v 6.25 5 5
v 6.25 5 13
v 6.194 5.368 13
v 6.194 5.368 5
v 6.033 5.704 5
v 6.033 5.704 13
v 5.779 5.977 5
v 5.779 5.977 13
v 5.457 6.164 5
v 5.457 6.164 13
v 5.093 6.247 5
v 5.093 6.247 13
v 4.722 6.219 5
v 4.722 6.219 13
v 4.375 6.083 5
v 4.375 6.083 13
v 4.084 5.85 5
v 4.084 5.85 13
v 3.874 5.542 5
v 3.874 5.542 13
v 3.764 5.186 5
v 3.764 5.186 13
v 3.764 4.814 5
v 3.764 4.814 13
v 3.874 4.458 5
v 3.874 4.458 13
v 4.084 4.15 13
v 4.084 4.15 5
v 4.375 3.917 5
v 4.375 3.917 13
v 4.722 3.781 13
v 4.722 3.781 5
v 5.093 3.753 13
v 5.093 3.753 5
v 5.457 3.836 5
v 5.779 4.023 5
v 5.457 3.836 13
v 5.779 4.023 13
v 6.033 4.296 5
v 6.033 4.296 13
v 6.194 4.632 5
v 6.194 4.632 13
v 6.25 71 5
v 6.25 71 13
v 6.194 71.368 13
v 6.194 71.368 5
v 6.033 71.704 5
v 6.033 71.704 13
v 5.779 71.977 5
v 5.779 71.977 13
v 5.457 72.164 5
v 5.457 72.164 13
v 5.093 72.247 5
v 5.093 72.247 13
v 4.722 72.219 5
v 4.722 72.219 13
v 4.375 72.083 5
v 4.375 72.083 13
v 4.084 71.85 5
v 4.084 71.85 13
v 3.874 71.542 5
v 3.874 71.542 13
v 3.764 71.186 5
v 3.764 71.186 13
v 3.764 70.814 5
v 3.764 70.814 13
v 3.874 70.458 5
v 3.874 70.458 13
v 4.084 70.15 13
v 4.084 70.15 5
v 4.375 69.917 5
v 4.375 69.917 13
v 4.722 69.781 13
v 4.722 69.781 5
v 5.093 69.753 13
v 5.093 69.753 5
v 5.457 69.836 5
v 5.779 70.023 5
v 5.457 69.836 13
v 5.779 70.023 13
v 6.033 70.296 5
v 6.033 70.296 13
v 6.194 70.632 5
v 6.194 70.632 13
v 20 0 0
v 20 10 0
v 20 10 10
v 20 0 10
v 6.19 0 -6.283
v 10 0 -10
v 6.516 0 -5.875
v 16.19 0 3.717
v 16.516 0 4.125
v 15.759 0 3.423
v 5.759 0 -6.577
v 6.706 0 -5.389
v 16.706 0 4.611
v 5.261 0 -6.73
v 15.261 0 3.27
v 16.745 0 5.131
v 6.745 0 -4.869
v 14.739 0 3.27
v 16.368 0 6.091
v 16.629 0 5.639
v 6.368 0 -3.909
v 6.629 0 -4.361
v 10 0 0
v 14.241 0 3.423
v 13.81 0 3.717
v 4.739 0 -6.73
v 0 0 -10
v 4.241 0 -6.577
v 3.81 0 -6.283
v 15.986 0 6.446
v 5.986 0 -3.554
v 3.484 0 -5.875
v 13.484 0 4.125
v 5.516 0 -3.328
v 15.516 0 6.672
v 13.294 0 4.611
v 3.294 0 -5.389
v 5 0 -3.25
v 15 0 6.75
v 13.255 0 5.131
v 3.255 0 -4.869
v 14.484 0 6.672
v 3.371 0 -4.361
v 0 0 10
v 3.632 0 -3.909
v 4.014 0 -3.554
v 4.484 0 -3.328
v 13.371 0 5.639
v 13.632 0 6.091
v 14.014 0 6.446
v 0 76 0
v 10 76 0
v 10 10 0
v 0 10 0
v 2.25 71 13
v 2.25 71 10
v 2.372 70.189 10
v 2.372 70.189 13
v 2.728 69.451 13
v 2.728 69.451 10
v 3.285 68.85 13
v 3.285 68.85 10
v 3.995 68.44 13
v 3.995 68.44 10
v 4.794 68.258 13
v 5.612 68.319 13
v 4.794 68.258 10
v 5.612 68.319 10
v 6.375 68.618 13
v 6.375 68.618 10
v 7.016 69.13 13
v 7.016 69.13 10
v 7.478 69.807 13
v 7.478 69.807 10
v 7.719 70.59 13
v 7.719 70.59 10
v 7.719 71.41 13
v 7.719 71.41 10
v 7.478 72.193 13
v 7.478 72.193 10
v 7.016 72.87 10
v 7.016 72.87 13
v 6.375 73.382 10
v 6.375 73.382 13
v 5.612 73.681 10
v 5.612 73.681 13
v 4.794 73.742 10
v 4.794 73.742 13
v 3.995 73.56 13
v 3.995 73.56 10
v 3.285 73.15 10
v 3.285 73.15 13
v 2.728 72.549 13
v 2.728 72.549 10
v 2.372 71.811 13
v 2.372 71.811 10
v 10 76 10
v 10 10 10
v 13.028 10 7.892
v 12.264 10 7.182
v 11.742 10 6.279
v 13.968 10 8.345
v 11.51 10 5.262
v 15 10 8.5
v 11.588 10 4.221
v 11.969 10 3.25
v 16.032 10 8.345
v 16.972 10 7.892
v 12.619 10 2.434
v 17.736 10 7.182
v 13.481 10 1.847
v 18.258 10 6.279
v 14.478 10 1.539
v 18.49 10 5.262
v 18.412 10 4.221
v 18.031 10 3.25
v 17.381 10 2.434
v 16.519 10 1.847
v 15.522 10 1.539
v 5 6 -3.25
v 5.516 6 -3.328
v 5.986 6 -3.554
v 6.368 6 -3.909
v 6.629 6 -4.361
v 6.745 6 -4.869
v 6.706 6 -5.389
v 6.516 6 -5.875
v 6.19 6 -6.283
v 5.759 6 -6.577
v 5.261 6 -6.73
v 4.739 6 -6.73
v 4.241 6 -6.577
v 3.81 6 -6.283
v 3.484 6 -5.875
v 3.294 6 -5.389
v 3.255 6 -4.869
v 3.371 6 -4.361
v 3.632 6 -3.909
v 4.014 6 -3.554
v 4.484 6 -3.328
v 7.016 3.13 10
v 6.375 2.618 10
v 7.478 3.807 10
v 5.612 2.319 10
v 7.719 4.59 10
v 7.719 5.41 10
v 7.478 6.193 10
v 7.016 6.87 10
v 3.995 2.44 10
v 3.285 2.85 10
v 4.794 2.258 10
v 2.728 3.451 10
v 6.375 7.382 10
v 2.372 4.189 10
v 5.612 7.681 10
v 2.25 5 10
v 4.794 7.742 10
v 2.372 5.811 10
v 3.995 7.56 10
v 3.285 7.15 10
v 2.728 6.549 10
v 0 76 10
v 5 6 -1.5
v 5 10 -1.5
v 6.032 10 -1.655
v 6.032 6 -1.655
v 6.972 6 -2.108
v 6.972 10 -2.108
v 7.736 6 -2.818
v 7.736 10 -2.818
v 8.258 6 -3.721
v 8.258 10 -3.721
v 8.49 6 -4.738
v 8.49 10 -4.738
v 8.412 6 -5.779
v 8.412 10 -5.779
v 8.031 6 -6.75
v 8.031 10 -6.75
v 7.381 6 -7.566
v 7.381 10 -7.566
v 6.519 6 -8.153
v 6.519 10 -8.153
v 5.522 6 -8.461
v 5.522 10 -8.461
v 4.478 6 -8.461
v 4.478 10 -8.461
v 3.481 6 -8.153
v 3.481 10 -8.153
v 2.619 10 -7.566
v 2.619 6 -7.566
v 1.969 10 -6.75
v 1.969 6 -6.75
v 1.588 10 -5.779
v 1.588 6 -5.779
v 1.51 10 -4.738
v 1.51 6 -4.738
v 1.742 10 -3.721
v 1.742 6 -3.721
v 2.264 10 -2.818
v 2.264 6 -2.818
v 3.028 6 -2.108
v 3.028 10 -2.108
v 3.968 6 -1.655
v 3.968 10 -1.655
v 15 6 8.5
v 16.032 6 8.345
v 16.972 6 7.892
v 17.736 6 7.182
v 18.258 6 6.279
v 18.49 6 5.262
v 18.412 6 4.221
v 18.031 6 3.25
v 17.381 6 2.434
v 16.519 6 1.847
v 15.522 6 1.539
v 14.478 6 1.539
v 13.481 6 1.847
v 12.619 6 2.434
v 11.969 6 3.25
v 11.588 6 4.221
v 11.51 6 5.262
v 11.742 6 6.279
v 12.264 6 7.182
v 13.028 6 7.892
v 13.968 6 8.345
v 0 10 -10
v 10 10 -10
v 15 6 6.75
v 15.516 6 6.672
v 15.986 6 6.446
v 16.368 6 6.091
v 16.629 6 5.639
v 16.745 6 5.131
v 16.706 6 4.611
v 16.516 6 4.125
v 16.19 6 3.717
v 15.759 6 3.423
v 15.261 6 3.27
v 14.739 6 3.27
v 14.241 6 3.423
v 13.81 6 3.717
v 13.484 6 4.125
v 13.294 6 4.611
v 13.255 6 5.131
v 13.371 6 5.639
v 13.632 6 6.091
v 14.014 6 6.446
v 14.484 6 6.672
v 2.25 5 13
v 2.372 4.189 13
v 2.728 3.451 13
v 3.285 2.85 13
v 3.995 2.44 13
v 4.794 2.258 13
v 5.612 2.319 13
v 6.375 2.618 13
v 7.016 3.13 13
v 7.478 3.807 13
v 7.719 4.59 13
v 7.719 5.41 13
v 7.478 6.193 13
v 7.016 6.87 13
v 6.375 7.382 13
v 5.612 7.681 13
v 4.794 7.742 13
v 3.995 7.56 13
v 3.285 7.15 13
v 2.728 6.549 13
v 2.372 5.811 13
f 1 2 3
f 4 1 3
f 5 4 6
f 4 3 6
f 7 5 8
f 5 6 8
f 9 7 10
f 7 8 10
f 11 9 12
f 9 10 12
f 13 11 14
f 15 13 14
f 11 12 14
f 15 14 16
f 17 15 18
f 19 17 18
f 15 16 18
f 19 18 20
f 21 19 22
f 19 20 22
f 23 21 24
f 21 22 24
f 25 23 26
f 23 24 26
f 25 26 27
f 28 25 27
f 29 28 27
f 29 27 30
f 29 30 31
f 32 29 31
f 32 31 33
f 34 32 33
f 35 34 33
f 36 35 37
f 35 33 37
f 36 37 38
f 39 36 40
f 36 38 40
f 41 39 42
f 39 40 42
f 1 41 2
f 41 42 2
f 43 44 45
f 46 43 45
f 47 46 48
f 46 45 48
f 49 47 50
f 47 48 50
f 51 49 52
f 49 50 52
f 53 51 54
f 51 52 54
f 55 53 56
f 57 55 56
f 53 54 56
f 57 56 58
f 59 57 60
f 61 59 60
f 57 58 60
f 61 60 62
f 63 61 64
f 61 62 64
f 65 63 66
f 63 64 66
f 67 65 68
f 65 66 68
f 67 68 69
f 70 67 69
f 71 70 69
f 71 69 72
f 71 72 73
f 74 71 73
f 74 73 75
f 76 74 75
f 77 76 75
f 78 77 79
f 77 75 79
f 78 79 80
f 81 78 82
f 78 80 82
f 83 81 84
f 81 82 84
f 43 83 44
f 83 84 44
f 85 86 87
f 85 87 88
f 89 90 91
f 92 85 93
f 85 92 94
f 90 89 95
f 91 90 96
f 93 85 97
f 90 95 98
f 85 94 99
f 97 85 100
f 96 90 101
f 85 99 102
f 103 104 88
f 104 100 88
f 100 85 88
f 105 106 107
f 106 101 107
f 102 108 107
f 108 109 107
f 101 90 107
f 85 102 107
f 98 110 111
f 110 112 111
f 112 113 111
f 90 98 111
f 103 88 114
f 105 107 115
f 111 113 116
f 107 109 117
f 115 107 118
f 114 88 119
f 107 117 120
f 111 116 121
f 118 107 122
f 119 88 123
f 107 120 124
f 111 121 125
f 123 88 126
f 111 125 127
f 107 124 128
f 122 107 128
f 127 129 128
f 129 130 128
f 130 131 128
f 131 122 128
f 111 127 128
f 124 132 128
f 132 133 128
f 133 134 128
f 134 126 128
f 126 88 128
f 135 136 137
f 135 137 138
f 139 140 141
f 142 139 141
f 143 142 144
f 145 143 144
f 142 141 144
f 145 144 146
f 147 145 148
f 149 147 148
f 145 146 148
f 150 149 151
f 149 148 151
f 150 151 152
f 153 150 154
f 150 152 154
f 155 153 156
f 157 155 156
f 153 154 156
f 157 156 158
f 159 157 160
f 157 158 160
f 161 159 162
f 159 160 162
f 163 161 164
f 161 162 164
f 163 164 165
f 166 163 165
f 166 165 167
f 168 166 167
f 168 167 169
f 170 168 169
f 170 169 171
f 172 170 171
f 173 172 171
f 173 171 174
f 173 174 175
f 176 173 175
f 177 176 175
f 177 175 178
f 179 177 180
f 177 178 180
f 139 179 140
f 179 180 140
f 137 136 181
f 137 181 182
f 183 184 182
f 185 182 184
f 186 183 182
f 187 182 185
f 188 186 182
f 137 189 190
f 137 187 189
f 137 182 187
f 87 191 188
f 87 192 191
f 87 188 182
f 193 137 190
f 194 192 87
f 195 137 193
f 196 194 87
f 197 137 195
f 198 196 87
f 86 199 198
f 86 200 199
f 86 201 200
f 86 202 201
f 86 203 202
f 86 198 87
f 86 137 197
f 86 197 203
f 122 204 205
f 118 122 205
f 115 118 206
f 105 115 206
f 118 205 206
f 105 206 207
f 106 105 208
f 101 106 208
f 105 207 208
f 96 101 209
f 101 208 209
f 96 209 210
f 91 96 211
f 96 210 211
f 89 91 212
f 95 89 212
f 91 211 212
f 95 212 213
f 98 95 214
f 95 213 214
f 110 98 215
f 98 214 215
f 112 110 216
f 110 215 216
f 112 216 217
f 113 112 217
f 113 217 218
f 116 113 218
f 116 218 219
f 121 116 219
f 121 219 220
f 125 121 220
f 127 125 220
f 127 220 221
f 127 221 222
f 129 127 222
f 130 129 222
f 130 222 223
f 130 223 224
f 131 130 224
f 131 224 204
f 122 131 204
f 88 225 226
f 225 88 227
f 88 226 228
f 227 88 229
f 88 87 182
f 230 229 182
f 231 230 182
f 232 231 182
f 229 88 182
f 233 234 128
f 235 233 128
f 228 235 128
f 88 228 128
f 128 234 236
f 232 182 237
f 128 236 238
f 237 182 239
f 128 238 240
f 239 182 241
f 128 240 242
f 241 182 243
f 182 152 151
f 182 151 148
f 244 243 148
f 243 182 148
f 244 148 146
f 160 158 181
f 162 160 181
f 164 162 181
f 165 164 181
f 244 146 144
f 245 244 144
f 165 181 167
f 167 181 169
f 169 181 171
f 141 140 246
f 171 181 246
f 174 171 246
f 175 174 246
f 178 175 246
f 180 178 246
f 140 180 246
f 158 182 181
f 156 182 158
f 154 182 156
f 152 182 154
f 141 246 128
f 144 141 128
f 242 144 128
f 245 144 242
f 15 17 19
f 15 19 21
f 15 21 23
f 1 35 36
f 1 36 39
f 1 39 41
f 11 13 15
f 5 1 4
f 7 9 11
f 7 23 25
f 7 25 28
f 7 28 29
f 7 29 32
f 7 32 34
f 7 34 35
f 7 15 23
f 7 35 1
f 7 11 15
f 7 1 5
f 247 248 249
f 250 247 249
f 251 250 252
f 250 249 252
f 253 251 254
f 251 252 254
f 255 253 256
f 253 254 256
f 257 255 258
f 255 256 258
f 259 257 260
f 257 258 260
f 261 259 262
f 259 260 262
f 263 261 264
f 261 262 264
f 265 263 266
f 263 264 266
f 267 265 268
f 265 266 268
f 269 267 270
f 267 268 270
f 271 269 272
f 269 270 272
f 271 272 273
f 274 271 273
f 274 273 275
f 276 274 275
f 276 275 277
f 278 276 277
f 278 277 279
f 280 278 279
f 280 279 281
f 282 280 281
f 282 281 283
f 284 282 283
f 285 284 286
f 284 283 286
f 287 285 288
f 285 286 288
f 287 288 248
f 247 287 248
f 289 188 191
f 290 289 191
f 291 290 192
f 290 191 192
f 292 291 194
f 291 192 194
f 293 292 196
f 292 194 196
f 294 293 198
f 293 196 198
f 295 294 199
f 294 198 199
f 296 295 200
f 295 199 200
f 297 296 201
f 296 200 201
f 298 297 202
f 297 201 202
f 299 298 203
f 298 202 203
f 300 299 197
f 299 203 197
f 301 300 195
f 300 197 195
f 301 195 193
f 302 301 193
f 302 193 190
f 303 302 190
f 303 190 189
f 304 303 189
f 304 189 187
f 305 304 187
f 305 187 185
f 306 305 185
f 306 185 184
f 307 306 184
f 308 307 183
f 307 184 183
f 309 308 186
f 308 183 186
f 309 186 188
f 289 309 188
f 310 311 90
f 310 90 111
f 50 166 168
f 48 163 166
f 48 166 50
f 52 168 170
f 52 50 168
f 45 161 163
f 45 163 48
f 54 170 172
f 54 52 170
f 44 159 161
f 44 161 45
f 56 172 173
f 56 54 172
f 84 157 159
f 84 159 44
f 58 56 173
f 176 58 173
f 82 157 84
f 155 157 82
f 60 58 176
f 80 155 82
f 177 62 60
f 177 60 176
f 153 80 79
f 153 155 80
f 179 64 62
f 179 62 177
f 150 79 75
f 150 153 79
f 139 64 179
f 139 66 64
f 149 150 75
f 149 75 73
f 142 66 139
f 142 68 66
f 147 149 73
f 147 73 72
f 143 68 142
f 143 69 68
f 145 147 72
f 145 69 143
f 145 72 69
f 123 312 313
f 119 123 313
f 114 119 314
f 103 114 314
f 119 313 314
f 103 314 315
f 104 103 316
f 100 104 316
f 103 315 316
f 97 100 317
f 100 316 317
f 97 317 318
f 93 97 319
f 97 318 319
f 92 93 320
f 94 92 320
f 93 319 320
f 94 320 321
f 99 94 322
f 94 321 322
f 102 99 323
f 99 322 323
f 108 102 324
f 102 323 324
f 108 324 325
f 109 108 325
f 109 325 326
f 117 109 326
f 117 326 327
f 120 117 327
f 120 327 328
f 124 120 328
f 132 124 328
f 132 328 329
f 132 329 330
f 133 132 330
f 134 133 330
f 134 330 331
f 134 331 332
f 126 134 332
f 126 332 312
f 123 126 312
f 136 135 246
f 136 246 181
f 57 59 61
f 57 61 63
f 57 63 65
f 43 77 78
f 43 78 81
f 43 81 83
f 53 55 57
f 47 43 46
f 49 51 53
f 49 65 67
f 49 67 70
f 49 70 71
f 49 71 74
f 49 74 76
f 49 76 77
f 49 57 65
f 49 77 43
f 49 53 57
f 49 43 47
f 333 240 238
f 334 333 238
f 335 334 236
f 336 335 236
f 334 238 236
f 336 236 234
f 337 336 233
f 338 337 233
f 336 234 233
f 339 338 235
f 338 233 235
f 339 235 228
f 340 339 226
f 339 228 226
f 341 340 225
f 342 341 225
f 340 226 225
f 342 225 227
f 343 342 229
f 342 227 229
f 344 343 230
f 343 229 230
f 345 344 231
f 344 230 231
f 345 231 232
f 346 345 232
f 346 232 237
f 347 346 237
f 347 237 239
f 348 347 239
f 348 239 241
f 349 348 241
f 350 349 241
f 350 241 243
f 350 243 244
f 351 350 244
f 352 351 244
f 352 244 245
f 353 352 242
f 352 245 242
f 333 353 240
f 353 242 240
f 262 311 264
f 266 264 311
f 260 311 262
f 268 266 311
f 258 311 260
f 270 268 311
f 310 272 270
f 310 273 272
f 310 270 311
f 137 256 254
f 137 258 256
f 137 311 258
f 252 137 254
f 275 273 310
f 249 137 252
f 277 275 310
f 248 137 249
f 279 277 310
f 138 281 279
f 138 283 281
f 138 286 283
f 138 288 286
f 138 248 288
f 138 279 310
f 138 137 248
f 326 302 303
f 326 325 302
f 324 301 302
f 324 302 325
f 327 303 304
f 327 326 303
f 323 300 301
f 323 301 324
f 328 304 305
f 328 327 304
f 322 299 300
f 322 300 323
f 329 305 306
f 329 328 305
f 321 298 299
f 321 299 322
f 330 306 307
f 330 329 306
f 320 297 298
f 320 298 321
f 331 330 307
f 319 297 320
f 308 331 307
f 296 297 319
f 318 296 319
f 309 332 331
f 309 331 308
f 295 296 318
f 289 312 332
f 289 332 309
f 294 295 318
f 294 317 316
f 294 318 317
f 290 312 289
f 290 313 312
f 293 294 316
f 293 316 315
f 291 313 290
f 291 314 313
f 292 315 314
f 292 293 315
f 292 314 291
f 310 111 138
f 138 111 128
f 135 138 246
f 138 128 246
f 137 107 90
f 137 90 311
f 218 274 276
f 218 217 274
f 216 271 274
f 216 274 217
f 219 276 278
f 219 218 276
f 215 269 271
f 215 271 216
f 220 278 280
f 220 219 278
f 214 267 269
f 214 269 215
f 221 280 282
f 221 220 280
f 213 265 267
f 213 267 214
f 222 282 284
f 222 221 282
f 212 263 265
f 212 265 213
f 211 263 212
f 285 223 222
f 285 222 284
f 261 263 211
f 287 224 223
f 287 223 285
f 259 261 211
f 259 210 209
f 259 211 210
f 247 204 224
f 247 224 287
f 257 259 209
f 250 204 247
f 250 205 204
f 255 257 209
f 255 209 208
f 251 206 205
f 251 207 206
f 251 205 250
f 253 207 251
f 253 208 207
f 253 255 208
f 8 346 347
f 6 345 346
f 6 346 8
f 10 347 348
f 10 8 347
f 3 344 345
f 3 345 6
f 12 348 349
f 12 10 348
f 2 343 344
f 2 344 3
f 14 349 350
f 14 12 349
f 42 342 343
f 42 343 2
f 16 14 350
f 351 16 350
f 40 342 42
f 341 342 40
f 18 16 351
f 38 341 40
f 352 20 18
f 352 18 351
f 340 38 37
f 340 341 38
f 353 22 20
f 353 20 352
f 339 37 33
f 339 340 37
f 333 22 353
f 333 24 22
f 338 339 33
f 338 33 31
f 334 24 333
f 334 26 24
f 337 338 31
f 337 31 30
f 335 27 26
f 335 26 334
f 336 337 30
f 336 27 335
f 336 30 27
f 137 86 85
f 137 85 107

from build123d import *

# Parameters (mm, degrees)
BOSS_EXTRU_1_DEPTH      = 10
ESQUISSE2_R             = 2.75
BOSS_EXTRU_2_DEPTH      = 3
ESQUISSE3_R             = 1.25
ENL_V_MAT_EXTRU_1_DEPTH = 8
ESQUISSE4_W             = 10
ESQUISSE4_H             = 10
BOSS_EXTRU_3_DEPTH      = 10
ENL_V_MAT_EXTRU_2_REACH = 72.178
ESQUISSE5_R             = 1.75
ESQUISSE6_R             = 3.5
ENL_V_MAT_EXTRU_3_DEPTH = 4


with BuildPart() as part:
    # Esquisse1 → Boss.-Extru.1 (new body)
    with BuildSketch(Plane.XY):
        Polygon((0, 76), (10, 76), (10, 10), (20, 10), (20, 0), (0, 0), align=None)
    extrude(amount=BOSS_EXTRU_1_DEPTH)

    # Esquisse2 → Boss.-Extru.2 (add)
    with BuildSketch(Plane.XY.offset(10)):
        with Locations(Location((5, 71, 0), (0, 0, 180))):
            Circle(ESQUISSE2_R)
        with Locations(Location((5, 5, 0), (0, 0, 180))):
            Circle(ESQUISSE2_R)
    extrude(amount=BOSS_EXTRU_2_DEPTH)

    # Esquisse3 → Enlèv. mat.-Extru.1 (cut)
    with BuildSketch(Plane.XY.offset(13)):
        with Locations((5, 71)):
            Circle(ESQUISSE3_R)
        with Locations((5, 5)):
            Circle(ESQUISSE3_R)
    extrude(amount=-ENL_V_MAT_EXTRU_1_DEPTH, mode=Mode.SUBTRACT)

    # Esquisse4 → Boss.-Extru.3 (add)
    with BuildSketch(Plane(origin=(0, 0, 0), x_dir=(-1, 0, 0), z_dir=(0, 0, -1))):
        with Locations((-5, 5)):
            Rectangle(ESQUISSE4_W, ESQUISSE4_H)
    extrude(amount=BOSS_EXTRU_3_DEPTH)

    # Esquisse5 → Enlèv. mat.-Extru.2 (cut, up to next)
    with BuildSketch(Plane(origin=(0, 10, 0), x_dir=(1, 0, 0), z_dir=(0, 1, 0)), mode=Mode.PRIVATE) as enl_v_mat_extru_2_sk1:
        with Locations(Location((15, -5, 0), (0, 0, 270))):
            Circle(ESQUISSE5_R)
    enl_v_mat_extru_2_tool1 = extrude(enl_v_mat_extru_2_sk1.sketch, amount=-ENL_V_MAT_EXTRU_2_REACH, mode=Mode.PRIVATE) & part.part
    # Esquisse5 → Enlèv. mat.-Extru.2 (cut, up to next)
    with BuildSketch(Plane(origin=(0, 10, 0), x_dir=(1, 0, 0), z_dir=(0, 1, 0)), mode=Mode.PRIVATE) as enl_v_mat_extru_2_sk2:
        with Locations(Location((5, 5, 0), (0, 0, 270))):
            Circle(ESQUISSE5_R)
    enl_v_mat_extru_2_tool2 = extrude(enl_v_mat_extru_2_sk2.sketch, amount=-ENL_V_MAT_EXTRU_2_REACH, mode=Mode.PRIVATE) & part.part
    add(enl_v_mat_extru_2_tool1.solids().sort_by_distance((15, 10, 5))[0], mode=Mode.SUBTRACT)
    add(enl_v_mat_extru_2_tool2.solids().sort_by_distance((5, 10, -5))[0], mode=Mode.SUBTRACT)

    # Esquisse6 → Enlèv. mat.-Extru.3 (cut)
    with BuildSketch(Plane(origin=(0, 10, 0), x_dir=(1, 0, 0), z_dir=(0, 1, 0))):
        with Locations(Location((15, -5, 0), (0, 0, 270))):
            Circle(ESQUISSE6_R)
        with Locations(Location((5, 5, 0), (0, 0, 270))):
            Circle(ESQUISSE6_R)
    extrude(amount=-ENL_V_MAT_EXTRU_3_DEPTH, mode=Mode.SUBTRACT)


solid = part.part
